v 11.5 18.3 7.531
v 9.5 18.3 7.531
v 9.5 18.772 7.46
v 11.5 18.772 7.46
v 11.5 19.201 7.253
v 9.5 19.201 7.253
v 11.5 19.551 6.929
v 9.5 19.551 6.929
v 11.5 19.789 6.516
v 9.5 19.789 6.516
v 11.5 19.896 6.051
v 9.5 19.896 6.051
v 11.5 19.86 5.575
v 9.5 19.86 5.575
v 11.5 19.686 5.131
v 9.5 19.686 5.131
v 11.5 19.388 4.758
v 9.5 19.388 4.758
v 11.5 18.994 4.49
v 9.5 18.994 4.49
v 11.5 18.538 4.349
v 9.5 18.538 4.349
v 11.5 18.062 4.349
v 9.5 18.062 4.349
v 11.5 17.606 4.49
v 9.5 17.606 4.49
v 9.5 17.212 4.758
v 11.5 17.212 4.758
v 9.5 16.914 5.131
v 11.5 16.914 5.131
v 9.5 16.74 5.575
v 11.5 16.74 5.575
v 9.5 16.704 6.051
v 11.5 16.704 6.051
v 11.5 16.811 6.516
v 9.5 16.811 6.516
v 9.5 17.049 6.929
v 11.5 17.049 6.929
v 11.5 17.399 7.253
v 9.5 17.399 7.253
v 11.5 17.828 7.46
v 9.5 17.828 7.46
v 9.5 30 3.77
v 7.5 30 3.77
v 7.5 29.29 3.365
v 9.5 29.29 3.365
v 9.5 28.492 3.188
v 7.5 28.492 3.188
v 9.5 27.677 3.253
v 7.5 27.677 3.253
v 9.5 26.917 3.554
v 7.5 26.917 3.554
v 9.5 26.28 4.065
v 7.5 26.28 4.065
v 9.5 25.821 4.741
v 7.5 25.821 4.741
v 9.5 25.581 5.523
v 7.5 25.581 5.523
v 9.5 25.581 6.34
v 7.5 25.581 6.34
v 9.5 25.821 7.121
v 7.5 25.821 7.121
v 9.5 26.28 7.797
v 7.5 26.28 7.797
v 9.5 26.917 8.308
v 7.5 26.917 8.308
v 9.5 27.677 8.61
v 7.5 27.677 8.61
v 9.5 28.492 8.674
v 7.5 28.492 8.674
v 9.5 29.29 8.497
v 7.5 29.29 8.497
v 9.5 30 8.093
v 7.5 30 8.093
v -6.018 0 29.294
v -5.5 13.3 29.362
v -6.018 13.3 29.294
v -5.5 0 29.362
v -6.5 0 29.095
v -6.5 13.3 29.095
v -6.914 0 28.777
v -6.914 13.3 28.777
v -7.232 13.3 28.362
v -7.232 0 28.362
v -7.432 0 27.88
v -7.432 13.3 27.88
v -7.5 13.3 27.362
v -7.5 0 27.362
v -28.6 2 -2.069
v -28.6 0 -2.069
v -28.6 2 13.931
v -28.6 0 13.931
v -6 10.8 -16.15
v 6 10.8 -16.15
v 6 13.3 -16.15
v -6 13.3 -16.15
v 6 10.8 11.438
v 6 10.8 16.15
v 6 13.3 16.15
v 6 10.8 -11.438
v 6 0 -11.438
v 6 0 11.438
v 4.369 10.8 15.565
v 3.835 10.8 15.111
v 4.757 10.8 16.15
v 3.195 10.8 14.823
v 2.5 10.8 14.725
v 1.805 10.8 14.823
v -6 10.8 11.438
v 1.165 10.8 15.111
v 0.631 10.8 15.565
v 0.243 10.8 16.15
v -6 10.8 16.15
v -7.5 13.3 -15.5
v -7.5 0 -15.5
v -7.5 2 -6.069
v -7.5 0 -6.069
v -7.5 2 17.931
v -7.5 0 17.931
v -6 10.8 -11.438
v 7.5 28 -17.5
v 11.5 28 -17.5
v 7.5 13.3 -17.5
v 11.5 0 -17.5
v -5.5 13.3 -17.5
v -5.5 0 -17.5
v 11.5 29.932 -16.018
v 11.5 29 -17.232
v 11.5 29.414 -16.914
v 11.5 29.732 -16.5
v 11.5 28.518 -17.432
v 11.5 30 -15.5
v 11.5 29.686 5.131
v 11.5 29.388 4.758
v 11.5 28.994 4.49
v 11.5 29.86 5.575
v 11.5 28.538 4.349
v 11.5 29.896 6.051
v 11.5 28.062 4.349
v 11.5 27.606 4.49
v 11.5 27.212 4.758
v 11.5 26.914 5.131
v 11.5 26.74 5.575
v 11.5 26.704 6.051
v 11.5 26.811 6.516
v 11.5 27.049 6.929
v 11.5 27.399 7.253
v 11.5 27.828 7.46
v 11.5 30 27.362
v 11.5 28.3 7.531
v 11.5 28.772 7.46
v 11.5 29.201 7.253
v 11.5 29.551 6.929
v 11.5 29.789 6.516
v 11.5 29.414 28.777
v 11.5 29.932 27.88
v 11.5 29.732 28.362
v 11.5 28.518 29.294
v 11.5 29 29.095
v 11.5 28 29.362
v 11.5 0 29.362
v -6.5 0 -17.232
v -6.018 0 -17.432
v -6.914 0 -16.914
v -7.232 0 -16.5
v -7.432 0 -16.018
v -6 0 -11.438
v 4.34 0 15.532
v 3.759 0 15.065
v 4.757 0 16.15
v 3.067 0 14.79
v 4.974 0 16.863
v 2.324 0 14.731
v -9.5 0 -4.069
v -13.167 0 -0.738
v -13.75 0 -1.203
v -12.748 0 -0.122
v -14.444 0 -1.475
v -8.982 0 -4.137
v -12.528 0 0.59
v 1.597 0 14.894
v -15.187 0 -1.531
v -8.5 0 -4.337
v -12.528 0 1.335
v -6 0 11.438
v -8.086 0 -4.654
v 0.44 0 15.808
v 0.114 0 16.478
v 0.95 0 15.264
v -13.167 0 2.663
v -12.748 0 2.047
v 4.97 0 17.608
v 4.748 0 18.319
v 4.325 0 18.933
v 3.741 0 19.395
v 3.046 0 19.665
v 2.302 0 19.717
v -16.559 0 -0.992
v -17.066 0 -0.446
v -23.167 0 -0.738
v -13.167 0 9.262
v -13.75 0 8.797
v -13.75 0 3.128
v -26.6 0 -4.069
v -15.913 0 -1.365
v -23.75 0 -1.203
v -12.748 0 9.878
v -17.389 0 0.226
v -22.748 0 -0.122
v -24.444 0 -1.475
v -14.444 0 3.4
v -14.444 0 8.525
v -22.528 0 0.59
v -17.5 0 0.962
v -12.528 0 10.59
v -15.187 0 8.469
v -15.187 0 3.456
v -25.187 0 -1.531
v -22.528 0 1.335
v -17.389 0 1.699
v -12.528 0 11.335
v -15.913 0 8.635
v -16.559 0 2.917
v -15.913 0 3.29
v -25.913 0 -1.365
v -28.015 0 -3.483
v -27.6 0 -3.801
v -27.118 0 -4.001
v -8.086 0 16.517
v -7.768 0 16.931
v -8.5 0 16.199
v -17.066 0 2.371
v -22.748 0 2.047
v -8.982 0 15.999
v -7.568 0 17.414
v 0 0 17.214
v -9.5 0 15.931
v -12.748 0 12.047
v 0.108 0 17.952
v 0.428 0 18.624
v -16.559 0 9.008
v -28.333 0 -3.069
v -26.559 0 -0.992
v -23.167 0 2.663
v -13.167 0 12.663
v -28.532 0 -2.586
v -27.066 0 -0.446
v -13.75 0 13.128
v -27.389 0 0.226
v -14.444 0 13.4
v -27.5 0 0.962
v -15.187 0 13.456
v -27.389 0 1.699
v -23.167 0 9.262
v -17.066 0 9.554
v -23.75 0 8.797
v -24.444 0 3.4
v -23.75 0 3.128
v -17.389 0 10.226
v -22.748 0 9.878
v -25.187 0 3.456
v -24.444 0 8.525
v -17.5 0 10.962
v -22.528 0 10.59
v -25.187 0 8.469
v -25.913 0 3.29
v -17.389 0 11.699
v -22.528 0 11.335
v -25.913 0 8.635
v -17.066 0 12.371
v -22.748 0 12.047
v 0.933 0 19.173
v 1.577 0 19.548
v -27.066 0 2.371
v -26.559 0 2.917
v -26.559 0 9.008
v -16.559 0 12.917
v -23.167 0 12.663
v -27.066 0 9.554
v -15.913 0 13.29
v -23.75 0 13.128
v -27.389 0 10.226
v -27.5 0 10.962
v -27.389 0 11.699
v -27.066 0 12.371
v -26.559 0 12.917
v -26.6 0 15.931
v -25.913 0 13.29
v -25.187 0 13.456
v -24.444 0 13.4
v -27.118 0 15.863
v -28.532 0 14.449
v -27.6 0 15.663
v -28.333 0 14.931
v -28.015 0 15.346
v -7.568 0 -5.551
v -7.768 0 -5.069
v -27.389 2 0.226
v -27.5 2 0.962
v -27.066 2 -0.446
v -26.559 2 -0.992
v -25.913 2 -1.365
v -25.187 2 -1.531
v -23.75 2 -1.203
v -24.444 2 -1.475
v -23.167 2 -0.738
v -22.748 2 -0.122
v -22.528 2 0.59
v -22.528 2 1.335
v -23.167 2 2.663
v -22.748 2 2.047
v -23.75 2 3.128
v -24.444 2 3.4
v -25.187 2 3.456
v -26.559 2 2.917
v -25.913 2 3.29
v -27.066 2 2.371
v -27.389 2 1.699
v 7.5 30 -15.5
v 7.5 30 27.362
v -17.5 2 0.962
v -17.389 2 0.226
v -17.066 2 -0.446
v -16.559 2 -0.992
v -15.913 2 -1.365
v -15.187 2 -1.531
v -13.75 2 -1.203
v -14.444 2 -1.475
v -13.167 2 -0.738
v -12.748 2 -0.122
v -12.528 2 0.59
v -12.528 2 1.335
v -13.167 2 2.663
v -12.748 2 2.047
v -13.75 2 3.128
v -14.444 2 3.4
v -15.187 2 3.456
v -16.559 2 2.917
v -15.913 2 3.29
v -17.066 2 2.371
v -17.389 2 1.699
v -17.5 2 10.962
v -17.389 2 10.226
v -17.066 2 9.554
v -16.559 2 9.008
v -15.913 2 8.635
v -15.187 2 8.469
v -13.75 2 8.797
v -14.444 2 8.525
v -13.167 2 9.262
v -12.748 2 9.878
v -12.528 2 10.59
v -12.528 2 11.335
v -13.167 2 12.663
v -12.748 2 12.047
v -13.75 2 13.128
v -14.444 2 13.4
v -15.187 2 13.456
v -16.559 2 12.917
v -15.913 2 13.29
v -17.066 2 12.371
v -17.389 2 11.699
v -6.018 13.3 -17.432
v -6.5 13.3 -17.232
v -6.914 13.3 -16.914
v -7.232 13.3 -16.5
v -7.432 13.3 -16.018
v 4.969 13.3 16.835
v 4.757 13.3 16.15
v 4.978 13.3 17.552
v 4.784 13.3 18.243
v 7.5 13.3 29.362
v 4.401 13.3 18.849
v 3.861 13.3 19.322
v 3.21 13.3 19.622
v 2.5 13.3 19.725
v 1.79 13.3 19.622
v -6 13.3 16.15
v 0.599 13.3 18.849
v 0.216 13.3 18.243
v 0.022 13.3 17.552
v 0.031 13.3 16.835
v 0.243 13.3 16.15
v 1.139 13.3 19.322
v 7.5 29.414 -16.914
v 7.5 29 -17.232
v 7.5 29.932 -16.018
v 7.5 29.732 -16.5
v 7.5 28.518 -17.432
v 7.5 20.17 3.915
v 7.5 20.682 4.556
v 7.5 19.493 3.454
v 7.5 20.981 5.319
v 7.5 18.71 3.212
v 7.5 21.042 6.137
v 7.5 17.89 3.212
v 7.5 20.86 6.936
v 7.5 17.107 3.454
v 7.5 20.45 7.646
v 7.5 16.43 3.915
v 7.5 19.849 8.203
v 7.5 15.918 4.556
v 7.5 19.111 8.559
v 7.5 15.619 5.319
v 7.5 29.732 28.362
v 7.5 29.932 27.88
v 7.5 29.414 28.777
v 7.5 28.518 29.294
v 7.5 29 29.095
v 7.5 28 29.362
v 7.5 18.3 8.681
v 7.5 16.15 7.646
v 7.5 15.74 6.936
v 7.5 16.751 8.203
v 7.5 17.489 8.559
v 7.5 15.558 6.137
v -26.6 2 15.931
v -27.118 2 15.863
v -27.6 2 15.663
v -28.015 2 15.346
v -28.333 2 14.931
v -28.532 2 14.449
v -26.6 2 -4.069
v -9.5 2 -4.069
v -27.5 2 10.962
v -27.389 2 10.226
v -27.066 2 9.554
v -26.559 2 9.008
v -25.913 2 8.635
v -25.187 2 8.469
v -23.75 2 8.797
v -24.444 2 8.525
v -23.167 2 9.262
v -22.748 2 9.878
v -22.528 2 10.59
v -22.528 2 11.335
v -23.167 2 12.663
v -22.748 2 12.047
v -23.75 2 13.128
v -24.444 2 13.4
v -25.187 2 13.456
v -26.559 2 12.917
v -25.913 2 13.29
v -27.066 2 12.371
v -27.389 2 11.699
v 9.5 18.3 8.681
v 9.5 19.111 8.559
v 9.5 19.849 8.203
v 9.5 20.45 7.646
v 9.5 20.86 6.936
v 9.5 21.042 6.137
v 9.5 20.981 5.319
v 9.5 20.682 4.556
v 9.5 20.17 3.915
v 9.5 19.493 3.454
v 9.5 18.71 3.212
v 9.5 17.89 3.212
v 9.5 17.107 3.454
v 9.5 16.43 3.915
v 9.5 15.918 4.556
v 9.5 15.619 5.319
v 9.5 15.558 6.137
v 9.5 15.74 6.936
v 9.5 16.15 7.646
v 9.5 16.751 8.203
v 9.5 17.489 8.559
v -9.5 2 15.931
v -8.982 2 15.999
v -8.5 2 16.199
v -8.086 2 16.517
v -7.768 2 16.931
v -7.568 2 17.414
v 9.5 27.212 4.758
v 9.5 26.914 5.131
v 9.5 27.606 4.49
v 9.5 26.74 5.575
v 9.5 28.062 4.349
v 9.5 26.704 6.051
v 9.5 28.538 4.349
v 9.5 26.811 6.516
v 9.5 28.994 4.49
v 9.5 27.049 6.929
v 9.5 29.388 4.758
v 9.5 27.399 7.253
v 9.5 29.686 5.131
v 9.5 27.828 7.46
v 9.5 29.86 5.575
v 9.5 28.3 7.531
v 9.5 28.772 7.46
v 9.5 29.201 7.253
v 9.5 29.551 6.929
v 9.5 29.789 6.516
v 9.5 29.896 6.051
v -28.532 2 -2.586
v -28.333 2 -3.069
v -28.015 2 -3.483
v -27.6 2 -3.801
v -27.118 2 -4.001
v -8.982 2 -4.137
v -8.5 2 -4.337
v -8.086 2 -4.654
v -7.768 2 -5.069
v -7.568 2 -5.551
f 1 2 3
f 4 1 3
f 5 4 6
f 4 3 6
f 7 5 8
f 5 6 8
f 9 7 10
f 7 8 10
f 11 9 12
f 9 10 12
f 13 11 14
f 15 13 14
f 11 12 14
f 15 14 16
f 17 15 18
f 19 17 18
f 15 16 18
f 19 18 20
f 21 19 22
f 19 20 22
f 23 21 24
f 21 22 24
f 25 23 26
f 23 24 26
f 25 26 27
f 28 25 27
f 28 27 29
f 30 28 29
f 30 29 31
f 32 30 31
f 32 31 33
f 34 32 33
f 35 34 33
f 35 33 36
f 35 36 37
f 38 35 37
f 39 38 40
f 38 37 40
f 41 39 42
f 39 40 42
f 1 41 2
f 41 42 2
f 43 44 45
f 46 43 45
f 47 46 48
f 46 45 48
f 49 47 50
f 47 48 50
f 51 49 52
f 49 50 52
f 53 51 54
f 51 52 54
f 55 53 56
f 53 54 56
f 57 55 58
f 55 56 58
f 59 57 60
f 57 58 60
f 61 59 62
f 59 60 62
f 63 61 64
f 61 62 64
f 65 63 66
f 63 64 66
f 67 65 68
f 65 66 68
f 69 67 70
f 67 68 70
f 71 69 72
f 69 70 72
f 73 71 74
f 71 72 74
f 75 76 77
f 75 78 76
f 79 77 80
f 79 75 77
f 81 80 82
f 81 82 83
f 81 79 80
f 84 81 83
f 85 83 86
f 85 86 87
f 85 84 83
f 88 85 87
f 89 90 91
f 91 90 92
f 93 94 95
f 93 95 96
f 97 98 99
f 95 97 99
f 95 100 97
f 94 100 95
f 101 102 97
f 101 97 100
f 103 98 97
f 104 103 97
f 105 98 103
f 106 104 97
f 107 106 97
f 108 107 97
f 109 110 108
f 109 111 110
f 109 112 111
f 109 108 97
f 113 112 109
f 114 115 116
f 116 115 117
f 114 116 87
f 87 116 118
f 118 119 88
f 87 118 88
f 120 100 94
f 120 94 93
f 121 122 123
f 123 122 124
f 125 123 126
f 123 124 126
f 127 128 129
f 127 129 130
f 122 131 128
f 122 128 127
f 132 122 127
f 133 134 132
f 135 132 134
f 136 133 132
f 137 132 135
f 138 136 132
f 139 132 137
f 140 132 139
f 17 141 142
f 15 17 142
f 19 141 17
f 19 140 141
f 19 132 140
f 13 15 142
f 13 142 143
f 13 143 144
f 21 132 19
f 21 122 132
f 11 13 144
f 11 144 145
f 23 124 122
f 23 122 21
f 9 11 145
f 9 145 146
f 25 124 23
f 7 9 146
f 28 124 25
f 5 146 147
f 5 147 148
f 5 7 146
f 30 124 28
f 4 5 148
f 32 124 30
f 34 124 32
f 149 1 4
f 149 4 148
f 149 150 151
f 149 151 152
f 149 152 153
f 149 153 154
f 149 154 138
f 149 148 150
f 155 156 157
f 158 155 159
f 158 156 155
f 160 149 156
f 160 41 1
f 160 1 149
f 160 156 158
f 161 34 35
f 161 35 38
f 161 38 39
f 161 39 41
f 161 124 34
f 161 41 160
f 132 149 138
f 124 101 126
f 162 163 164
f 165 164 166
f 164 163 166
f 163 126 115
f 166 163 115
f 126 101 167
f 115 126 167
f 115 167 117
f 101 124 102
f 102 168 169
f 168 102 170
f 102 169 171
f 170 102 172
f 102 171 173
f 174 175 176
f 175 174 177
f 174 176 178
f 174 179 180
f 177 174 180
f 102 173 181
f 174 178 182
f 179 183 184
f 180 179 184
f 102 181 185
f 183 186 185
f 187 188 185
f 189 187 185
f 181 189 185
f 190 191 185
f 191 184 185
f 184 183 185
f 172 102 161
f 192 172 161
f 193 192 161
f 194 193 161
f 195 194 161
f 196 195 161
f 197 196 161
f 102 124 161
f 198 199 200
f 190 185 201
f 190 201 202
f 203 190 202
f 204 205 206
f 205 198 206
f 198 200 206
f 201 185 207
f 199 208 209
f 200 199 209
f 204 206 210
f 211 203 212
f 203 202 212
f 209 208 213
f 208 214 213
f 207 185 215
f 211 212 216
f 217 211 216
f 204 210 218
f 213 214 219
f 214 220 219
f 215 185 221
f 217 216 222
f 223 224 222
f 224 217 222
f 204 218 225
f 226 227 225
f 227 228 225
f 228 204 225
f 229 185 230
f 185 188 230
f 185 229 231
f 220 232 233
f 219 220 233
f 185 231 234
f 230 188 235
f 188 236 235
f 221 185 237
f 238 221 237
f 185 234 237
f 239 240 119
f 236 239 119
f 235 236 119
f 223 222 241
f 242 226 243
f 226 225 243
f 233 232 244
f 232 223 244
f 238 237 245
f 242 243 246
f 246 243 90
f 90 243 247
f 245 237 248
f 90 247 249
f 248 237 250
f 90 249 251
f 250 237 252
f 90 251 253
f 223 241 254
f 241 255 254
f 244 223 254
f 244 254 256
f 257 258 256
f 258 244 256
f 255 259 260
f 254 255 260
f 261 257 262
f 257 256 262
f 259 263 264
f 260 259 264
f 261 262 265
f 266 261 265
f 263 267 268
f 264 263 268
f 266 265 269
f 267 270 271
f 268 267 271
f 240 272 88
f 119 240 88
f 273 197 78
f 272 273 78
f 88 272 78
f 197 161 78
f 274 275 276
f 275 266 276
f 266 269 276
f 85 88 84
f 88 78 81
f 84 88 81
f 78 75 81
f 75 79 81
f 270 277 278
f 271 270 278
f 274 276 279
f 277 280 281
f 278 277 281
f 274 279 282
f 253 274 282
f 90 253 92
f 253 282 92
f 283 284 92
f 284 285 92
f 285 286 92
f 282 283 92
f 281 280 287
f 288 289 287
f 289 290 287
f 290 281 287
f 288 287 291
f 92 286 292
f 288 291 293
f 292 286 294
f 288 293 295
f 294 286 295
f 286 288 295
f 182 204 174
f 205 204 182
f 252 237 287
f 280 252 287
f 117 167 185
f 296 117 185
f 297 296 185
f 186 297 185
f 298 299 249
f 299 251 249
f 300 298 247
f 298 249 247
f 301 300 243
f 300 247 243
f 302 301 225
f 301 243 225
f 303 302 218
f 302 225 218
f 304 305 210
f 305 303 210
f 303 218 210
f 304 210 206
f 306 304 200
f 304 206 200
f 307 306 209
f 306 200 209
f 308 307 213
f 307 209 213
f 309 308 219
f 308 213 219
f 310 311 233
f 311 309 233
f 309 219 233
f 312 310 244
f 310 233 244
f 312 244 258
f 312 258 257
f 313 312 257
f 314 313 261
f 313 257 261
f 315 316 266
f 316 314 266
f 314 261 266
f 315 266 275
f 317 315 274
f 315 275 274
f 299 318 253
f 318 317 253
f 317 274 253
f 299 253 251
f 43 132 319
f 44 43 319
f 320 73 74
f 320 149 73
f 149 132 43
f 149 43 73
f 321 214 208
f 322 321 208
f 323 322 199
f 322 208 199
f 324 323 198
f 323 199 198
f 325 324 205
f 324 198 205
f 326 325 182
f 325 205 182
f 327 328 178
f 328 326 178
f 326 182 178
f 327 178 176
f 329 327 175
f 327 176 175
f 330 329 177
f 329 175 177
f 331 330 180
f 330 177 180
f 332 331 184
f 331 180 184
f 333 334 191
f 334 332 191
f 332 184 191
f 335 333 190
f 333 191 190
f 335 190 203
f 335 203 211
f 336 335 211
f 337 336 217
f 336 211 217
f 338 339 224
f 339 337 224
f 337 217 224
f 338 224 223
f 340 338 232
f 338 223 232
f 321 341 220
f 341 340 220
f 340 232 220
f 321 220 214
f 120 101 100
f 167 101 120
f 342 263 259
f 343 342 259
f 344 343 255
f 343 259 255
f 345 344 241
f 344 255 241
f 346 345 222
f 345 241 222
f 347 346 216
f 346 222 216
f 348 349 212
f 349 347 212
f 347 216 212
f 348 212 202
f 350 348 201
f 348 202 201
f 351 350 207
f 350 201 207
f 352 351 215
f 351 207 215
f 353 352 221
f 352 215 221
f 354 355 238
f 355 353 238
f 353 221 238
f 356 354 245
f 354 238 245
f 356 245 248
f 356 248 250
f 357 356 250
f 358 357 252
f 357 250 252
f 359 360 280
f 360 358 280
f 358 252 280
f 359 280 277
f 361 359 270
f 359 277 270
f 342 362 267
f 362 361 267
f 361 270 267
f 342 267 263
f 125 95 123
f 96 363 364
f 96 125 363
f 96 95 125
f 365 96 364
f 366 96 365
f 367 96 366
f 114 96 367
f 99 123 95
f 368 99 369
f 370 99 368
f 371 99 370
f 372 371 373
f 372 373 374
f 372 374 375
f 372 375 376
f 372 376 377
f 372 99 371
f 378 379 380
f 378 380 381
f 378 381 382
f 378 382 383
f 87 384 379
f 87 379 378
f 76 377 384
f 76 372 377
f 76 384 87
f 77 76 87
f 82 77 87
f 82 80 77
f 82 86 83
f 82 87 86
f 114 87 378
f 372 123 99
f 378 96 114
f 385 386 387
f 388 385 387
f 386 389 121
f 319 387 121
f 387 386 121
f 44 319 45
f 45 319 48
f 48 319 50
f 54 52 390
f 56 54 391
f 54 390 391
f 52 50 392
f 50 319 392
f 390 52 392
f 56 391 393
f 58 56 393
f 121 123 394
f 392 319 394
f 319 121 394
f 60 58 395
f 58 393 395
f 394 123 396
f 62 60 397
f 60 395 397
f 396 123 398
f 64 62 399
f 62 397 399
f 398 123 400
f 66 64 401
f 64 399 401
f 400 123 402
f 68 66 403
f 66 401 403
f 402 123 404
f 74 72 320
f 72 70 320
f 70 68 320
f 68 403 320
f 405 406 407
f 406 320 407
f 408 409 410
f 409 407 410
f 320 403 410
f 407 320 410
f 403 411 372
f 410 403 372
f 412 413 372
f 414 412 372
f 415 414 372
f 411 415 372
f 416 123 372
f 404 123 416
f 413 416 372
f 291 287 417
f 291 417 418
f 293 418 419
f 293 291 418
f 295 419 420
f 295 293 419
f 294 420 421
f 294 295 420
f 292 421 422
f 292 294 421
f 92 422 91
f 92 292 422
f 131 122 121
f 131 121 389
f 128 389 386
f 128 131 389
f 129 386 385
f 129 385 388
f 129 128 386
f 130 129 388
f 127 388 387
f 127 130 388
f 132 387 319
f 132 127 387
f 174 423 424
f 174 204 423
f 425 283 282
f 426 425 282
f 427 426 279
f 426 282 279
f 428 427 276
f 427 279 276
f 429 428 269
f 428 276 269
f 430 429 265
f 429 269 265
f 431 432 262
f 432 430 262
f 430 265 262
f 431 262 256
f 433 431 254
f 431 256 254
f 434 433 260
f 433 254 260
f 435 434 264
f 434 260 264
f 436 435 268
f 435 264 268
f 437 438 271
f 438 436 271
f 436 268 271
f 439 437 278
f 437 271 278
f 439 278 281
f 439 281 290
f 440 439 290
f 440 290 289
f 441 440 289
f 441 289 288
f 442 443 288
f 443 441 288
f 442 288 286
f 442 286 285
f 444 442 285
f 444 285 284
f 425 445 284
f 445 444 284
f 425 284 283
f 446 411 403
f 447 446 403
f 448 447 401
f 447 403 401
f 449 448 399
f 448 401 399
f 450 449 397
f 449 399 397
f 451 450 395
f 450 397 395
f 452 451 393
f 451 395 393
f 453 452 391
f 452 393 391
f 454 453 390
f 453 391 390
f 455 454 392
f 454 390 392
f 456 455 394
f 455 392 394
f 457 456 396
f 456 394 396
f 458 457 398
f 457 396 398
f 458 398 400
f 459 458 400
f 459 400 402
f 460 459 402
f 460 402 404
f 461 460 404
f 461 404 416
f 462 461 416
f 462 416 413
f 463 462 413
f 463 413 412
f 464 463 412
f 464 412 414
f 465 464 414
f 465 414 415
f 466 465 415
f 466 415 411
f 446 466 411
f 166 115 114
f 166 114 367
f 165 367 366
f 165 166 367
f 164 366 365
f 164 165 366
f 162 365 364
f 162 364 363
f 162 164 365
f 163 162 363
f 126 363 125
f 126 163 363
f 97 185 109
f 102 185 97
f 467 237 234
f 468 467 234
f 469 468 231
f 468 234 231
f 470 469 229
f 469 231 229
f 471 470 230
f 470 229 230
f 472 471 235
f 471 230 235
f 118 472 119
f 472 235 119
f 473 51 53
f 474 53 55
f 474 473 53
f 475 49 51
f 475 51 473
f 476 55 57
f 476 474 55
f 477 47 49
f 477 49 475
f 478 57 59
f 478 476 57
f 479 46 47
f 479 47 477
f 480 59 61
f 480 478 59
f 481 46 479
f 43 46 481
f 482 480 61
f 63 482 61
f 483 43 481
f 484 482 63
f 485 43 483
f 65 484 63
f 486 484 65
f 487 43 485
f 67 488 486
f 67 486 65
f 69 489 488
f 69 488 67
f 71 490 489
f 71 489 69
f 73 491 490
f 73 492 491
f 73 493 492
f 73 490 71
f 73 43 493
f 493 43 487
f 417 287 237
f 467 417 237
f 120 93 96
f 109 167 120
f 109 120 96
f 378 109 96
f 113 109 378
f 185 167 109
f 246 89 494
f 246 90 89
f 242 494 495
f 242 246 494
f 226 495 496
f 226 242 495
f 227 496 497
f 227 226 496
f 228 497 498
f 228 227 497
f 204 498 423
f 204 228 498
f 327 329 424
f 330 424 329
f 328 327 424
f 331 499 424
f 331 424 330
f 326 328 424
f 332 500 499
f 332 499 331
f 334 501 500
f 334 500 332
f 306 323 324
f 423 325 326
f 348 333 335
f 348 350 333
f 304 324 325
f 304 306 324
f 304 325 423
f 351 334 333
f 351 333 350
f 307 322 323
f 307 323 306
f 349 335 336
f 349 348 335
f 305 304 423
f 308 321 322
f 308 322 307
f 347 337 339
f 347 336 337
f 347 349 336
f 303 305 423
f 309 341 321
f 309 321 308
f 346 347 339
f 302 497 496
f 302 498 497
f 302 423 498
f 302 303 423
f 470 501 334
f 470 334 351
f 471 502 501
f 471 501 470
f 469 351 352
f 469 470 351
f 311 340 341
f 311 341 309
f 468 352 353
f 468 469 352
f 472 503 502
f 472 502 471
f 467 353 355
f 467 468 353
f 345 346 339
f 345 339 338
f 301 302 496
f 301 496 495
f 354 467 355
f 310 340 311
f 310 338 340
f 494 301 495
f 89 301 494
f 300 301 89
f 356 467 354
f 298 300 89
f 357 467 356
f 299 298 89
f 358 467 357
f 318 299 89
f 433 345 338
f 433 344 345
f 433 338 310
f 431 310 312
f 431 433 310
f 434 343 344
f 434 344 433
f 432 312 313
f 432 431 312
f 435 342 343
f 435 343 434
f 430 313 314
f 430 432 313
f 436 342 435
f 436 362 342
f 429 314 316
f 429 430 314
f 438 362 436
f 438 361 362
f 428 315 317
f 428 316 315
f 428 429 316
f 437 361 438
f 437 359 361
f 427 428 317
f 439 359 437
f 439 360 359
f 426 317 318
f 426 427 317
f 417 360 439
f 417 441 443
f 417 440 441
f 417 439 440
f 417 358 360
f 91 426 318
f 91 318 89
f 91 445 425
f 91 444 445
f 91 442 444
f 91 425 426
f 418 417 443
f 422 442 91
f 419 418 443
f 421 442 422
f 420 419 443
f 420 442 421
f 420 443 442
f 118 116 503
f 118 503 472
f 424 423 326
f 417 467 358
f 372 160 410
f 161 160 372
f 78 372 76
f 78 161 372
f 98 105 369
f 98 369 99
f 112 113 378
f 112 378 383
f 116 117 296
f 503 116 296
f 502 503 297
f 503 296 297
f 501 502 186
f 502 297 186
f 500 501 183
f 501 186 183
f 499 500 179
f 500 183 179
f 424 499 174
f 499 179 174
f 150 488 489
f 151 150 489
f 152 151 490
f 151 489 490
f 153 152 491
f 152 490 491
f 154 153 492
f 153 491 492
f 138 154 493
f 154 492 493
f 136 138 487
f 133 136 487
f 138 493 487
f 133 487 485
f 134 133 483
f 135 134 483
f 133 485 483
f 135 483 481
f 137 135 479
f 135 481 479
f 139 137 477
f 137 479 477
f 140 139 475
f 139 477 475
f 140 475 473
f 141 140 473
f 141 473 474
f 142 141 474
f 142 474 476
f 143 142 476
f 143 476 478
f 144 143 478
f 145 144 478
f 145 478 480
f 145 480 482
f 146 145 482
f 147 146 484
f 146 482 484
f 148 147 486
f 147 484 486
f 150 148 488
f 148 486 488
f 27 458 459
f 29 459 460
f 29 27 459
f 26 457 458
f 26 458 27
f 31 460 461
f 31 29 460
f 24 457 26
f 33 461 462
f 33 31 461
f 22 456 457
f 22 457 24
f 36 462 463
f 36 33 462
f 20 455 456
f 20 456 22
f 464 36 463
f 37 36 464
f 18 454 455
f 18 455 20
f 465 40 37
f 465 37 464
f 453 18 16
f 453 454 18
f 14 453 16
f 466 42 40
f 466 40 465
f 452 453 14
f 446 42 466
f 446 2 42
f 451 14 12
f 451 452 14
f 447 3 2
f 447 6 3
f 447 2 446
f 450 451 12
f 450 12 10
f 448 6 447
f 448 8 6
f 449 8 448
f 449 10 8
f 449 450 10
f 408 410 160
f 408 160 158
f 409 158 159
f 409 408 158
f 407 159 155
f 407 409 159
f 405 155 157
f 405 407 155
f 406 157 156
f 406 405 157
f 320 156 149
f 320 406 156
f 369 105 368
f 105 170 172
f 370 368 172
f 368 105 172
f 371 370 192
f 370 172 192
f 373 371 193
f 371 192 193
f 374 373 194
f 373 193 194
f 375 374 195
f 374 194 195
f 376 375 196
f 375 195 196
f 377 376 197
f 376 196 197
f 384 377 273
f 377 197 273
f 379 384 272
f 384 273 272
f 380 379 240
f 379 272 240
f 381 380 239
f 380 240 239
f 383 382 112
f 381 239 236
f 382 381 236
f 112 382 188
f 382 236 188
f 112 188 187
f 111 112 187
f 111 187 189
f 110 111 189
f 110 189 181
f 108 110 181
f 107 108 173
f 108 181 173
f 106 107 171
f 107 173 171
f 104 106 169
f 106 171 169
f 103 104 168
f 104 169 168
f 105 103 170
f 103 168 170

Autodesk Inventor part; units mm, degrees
ref_plane "YZ Plane" through (0, 0, 0) normal (1, 0, 0) x (0, 1, 0)
ref_plane "XZ Plane" through (0, 0, 0) normal (0, 1, 0) x (-1, 0, 0)
ref_plane "XY Plane" through (0, 0, 0) normal (0, 0, 1) x (1, 0, 0)
sketch "Sketch1" plane through (0, 0, 0) normal (0, 1, 0) x (-1, 0, 0)
  line L0 (6, 11.4375) -> (-6, 11.4375)
  line L1 (-6, 11.4375) -> (-6, -11.4375)
  line L2 (-6, -11.4375) -> (6, -11.4375)
  line L3 (6, -11.4375) -> (6, 11.4375)
  line L4 (6, 11.4375) -> (-6, -11.4375) construction
  line L5 (-6, 11.4375) -> (6, -11.4375) construction
  line L6 (6, 16.15) -> (-6, 16.15)
  line L7 (-6, 16.15) -> (-6, -16.15)
  line L8 (-6, -16.15) -> (6, -16.15)
  line L9 (6, -16.15) -> (6, 16.15)
  line L10 (6, 16.15) -> (-6, -16.15) construction
  line L11 (-6, 16.15) -> (6, -16.15) construction
  circle A0 centre (0, -5.4375) radius 2.5
  circle A1 centre (-2.5, 17.225) radius 2.5
  line L12 (7.5, 17.5) -> (-7.5, 17.5)
  line L13 (-7.5, 17.5) -> (-7.5, -17.5)
  line L14 (-7.5, -17.5) -> (7.5, -17.5)
  line L15 (7.5, -17.5) -> (7.5, 17.5)
  line L16 (7.5, 17.5) -> (-7.5, -17.5) construction
  line L17 (-7.5, 17.5) -> (7.5, -17.5) construction
  line L18 (7.5, 17.5) -> (-7.5, 17.5)
  line L19 (-7.5, 17.5) -> (-7.5, 29.3625)
  line L20 (-7.5, 29.3625) -> (7.5, 29.3625)
  line L21 (7.5, 29.3625) -> (7.5, 17.5)
  circle A2 centre (15, 0.9625) radius 2.5
  circle A3 centre (15, 10.9625) radius 2.5
  circle A4 centre (25, 10.9625) radius 2.5
  circle A5 centre (25, 0.9625) radius 2.5
  line L22 (28.6005, 5.9313) -> (28.6005, -4.0687)
  line L23 (28.6005, -4.0687) -> (7.5, -4.0687)
  line L24 (28.6005, 5.9313) -> (28.6005, 15.9313)
  line L25 (28.6005, 15.9313) -> (7.5, 15.9313)
  line L26 (-7.5, -17.5) -> (-11.5, -17.5)
  line L27 (-11.5, -17.5) -> (-11.5, 29.3625)
  line L28 (-11.5, 29.3625) -> (-7.5, 29.3625)
  line L29 (-7.5, 29.3625) -> (-7.5, -17.5)
  point P0 (0, 0)
  point P1 (0, -11.4375)
  point P2 (-0.2429, 16.15)
  point P3 (-4.7571, 16.15)
  point P4 (-4.9848, 17.5)
  point P5 (-0.0152, 17.5)
  dimension "d2" = 12
  dimension "d3" = 22.875
  dimension "d4" = 12
  dimension "d5" = 32.3
  dimension "d6" = 5
  dimension "d7" = 6
  dimension "d8" = 5
  dimension "d9" = 22.8
  dimension "d10" = 15
  dimension "d11" = 35
  dimension "d17" = 5
  dimension "d18" = 15
  dimension "d19" = 6.4
  dimension "d20" = 5
  dimension "d21" = 10
  dimension "d22" = 5
  dimension "d23" = 10
  dimension "d25" = 5
  dimension "d27" = 10
  dimension "d31" = 4
  dimension "d46" = 10
extrude "Extrusion1" add sketch "Sketch1" along normal blind 10.8 contours L0 L7 L6 A1 L9 | L9 L8 L7 L2
extrude "Extrusion2" add sketch "Sketch1" along normal blind 13.3 contours L9 L6 A1 L12 L15 L14 L13 L7 L1 L8 L3 | L12 L19 L20 L21 A1
extrude "Extrusion3" add sketch "Sketch1" along normal blind 2 contours L25 L24 L22 L23 L15
fillet "Fillet1" radius 2 6 edges at (-7.5, 1, -4.0687) (-7.5, 1, 15.9313) (-28.6005, 1, 15.9313) (-28.6005, 1, -4.0687) (-7.5, 6.65, 29.3625) (-7.5, 6.65, -17.5)
extrude "Extrusion4" add sketch "Sketch1" along normal blind 30 contours L13 L26 L27 L28 L19
sketch "Sketch2" plane through (7.5, 13.3, 29.3625) normal (-1, 0, 0) x (0, 0, 1)
  circle A0 centre (-23.4313, 5) radius 1.6
  circle A1 centre (-23.4313, 5) radius 2.75
  circle A2 centre (-23.4313, 15) radius 1.6
  circle A3 centre (-23.4313, 15) radius 2.75
  line L0 (0, 0) -> (-46.8625, 0) projected
  point P0 (-29.3625, -13.3)
  dimension "d34" = 3.2
  dimension "d35" = 5.5
  dimension "d36" = 3.2
  dimension "d37" = 5.5
  dimension "d39" = 5
  dimension "d40" = 10
extrude "Extrusion5" cut sketch "Sketch2" against normal blind 4 contours A0 | A2
extrude "Extrusion6" cut sketch "Sketch2" against normal blind 2
fillet "Fillet2" radius 2 2 edges at (9.5, 30, 29.3625) (9.5, 30, -17.5)
properties part number "Bracket Servo_3DPrint"
